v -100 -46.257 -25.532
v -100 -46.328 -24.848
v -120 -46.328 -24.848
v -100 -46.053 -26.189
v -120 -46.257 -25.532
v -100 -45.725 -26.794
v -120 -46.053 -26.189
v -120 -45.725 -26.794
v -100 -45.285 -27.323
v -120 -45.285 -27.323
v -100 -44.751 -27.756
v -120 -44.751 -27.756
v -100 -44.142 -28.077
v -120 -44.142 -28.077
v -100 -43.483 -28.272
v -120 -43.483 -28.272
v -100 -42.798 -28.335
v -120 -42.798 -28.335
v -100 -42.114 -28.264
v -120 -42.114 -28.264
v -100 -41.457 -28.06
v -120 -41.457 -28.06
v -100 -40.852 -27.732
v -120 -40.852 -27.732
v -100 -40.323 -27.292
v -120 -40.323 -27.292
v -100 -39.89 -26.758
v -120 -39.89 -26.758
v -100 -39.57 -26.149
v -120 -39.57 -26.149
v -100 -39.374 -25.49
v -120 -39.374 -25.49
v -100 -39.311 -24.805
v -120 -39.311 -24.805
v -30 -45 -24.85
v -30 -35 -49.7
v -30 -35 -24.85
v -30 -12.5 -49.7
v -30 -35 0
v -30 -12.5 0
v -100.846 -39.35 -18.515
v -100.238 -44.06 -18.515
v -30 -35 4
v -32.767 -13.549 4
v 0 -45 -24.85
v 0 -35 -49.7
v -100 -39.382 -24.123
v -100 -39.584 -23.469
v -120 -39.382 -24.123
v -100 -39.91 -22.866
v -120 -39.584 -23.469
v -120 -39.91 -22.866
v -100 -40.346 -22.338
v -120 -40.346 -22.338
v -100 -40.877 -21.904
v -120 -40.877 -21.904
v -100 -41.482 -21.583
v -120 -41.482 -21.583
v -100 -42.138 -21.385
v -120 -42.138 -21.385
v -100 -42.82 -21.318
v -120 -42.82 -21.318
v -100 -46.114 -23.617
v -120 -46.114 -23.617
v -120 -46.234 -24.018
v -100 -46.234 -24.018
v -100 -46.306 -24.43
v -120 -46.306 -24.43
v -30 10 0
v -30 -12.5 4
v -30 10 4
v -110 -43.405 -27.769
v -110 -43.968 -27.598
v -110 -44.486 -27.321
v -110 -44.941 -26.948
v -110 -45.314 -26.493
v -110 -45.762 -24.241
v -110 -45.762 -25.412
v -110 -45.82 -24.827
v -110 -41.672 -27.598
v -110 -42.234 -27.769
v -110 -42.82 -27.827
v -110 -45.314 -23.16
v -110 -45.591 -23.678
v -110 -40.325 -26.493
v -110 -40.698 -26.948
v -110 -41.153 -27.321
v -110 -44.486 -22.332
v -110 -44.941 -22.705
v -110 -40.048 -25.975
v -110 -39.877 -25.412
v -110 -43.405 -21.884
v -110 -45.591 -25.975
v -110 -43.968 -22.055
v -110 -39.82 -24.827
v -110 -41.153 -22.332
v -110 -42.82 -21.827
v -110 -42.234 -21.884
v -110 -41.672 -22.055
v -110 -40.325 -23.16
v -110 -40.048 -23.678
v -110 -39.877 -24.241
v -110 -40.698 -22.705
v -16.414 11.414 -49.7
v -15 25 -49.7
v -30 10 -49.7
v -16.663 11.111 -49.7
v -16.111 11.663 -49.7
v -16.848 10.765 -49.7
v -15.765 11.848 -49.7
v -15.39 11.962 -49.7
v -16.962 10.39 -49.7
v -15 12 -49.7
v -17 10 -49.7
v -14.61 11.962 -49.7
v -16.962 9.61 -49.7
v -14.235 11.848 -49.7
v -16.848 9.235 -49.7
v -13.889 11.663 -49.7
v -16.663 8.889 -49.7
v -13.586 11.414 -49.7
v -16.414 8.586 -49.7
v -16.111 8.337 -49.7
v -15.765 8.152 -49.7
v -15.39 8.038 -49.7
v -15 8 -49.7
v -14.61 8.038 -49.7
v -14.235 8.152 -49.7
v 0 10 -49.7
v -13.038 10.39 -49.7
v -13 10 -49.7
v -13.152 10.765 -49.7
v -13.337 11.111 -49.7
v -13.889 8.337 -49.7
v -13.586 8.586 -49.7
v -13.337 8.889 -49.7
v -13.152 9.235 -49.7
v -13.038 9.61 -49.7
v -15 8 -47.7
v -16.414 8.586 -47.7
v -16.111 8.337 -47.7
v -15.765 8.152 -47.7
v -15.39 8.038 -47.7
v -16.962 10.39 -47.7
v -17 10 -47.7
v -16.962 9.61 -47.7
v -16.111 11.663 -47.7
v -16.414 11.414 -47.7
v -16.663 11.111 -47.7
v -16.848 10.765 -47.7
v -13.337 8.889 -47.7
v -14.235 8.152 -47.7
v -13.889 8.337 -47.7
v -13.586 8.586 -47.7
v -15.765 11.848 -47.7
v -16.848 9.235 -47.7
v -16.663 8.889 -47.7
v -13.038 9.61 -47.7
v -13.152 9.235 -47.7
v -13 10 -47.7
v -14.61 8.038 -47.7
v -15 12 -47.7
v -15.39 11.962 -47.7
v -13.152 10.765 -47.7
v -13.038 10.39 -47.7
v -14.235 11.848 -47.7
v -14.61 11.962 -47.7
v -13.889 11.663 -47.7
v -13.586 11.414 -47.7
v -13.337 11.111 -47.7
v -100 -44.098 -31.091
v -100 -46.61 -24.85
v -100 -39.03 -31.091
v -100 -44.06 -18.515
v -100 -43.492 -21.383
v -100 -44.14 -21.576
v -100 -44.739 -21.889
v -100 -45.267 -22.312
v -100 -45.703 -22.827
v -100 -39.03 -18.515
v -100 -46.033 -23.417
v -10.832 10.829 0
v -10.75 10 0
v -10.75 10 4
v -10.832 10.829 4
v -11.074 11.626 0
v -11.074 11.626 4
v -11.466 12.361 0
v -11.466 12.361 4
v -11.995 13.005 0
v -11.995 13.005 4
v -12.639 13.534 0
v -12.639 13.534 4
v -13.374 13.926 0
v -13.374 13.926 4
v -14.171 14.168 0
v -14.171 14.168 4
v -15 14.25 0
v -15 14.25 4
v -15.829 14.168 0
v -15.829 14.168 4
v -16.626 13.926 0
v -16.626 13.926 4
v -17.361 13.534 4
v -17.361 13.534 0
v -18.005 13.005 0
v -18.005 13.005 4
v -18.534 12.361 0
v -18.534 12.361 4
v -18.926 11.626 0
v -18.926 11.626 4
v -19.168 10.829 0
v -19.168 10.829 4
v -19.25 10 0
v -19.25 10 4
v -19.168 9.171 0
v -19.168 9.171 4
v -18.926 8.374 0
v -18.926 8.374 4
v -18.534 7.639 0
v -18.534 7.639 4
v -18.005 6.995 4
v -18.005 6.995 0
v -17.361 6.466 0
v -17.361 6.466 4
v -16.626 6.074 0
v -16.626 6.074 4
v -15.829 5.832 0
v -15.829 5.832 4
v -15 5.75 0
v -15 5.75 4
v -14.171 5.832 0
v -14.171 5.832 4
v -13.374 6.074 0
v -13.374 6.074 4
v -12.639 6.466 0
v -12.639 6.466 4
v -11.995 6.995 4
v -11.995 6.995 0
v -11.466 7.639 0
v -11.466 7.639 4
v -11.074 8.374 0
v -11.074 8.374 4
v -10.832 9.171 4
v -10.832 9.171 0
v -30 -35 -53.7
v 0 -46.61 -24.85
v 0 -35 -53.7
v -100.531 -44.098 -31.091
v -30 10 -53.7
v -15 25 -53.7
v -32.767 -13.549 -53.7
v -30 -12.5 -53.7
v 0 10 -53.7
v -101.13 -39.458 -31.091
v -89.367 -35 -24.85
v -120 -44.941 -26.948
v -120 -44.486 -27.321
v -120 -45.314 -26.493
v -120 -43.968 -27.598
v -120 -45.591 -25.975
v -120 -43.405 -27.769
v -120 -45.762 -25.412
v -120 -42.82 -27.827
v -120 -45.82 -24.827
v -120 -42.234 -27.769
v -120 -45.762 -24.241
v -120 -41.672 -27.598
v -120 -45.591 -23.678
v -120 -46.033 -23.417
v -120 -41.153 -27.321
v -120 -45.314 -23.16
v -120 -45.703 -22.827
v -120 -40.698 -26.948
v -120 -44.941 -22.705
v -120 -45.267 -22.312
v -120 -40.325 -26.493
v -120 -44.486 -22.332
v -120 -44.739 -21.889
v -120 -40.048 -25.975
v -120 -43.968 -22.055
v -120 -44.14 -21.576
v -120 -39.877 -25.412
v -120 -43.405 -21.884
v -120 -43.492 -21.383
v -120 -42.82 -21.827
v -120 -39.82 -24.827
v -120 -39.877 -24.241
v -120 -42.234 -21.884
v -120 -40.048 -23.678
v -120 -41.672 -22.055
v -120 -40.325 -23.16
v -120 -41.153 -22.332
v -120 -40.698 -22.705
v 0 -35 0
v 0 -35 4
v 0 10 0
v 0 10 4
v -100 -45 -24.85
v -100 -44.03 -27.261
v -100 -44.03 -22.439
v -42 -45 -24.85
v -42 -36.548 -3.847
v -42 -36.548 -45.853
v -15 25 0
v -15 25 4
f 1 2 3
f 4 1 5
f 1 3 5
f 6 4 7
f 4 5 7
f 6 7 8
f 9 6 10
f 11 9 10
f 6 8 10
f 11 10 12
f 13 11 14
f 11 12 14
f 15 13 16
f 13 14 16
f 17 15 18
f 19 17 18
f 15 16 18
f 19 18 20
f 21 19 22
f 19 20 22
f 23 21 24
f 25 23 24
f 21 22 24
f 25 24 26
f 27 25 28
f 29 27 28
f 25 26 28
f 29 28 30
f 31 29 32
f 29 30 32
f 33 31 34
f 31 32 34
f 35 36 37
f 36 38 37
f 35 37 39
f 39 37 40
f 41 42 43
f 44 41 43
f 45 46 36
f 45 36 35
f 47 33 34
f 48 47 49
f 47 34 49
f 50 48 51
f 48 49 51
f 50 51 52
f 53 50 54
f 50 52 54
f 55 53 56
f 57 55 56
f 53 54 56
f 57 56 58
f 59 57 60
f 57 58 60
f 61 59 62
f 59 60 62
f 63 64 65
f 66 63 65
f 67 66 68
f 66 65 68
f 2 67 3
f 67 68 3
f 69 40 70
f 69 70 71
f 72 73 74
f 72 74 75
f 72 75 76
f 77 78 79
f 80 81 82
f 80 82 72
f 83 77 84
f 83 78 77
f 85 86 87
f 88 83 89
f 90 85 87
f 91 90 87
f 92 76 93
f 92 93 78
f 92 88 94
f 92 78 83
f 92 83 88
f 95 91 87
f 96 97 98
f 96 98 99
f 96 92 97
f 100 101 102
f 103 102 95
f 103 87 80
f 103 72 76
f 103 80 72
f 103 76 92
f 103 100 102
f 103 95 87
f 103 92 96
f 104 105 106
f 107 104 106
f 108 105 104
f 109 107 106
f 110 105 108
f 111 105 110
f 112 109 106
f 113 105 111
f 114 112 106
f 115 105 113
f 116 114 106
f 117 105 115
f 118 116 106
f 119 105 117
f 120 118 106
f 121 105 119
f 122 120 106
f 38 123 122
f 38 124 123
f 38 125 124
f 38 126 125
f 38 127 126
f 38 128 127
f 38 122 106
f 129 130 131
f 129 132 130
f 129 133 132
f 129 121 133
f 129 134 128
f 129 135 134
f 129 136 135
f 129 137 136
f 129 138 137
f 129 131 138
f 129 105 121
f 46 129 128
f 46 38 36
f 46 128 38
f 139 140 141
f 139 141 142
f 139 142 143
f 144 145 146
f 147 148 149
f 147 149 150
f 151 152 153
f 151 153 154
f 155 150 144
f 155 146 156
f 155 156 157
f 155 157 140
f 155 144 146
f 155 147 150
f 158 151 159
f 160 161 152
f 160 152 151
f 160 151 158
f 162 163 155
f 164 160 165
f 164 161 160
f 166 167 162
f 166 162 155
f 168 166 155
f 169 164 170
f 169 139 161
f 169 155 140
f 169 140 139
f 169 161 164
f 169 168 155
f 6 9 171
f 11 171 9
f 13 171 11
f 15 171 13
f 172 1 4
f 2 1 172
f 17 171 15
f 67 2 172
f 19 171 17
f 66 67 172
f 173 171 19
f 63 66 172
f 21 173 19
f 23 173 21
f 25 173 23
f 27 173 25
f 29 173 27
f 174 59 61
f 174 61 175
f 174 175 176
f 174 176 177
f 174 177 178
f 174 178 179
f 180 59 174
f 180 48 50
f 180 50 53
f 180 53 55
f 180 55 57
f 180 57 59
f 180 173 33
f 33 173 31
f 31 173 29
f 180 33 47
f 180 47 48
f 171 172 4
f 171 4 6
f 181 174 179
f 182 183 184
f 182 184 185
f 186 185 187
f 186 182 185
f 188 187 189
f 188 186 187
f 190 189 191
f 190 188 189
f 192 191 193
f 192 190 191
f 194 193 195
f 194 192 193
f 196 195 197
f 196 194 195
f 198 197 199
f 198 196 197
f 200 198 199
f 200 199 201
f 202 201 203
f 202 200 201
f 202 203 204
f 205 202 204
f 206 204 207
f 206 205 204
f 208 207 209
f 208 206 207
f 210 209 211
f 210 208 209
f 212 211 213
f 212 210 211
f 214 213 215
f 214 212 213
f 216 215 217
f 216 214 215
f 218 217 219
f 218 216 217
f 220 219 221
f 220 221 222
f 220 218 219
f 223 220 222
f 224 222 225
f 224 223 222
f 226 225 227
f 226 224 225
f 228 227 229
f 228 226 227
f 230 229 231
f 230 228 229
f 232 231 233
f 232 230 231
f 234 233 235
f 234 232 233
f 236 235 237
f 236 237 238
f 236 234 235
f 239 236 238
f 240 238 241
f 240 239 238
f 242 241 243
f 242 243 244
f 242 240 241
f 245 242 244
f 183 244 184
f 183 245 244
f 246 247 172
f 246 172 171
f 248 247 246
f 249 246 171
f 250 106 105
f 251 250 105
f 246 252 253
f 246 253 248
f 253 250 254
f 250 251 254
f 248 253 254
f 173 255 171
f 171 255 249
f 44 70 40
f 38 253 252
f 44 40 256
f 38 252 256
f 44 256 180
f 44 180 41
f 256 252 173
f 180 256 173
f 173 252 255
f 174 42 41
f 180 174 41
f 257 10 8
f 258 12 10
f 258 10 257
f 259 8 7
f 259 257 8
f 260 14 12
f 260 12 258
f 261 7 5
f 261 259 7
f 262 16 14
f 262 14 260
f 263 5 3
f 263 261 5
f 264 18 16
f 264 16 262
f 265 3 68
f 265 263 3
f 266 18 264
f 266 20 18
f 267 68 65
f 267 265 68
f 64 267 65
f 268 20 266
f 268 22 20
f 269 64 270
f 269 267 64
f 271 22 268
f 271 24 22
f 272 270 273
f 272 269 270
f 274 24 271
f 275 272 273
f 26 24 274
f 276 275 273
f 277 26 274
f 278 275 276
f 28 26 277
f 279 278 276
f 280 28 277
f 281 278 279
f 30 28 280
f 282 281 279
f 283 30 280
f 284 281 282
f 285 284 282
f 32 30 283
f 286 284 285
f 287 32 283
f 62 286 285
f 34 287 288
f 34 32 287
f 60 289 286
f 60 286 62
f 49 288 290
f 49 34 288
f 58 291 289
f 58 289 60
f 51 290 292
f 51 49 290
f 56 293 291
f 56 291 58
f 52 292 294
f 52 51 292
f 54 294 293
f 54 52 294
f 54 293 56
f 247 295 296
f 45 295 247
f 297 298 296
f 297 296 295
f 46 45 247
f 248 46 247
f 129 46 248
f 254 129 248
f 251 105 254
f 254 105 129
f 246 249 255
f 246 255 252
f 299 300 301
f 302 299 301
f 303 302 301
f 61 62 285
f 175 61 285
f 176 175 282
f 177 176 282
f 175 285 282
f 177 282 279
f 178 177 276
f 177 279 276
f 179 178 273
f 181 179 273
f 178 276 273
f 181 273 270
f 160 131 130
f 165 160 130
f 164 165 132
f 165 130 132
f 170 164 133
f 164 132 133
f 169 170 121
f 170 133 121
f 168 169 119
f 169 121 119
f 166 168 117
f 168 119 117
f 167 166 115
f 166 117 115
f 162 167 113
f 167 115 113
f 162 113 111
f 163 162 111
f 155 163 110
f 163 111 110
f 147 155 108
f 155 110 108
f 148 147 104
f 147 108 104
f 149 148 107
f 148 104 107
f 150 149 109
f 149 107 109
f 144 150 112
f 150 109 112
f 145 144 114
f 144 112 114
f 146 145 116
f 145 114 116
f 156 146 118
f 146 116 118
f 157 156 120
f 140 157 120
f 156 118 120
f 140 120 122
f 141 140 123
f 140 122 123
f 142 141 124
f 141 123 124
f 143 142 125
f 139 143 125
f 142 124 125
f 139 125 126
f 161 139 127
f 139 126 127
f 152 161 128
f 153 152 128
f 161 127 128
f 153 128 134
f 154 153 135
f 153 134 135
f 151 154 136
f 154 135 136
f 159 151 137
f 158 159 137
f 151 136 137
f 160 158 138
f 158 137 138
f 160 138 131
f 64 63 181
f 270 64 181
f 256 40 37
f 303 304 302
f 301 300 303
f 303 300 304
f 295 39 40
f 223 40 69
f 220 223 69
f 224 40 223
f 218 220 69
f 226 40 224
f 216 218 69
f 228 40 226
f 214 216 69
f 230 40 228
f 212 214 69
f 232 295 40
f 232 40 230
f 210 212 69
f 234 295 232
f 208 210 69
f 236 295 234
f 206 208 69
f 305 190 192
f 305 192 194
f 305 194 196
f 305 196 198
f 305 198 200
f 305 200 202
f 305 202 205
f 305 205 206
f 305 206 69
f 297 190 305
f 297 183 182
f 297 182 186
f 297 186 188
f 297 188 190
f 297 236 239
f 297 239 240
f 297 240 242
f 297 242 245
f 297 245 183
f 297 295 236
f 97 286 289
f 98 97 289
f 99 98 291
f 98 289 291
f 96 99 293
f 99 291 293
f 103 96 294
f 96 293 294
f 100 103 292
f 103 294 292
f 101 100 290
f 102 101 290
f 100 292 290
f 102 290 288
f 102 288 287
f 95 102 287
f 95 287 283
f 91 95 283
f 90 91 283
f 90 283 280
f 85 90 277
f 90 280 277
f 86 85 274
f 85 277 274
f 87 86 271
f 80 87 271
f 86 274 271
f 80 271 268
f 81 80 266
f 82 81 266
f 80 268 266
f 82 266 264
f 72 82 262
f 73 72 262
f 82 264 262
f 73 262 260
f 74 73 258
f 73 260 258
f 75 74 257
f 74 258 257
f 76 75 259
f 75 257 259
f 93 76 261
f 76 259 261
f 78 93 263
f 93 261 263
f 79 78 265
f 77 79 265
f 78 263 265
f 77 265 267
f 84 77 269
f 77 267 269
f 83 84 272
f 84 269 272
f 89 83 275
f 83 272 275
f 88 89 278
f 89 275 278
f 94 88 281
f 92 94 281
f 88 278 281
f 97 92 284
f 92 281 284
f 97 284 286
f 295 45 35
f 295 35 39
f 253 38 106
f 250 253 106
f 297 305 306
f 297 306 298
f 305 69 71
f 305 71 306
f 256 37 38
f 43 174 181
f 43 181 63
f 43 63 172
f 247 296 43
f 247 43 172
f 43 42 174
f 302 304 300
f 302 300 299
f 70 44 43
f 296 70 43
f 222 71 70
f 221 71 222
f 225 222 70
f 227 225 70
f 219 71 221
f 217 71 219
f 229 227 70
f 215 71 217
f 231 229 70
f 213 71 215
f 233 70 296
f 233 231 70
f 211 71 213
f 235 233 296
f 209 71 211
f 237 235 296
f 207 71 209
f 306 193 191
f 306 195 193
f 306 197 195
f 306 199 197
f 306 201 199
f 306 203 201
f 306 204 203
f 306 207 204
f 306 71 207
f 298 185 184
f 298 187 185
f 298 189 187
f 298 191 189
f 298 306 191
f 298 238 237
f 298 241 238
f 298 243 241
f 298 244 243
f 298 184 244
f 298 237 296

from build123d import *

# Parameters (mm, degrees)
SKETCH1_R                = 4.25
BOSS_EXTRUDE1_DEPTH      = 4
BOSS_EXTRUDE2_DEPTH      = 4
SKETCH3_R                = 2
BOSS_EXTRUDE3_DEPTH      = 2
BOSS_EXTRUDE4_DEPTH      = 53.7
BOSS_EXTRUDE4_DEPTH_BACK = 4
CUT_EXTRUDE1_DEPTH       = 53.7
BOSS_EXTRUDE5_DEPTH      = 120
CUT_EXTRUDE2_DEPTH       = 120
CUT_EXTRUDE2_DEPTH_BACK  = 120
BOSS_EXTRUDE6_DEPTH      = 53.7
BOSS_EXTRUDE6_DEPTH_BACK = 4
CUT_EXTRUDE3_DEPTH       = 53.7
CUT_EXTRUDE4_DEPTH       = 53.7
SKETCH18_W               = 12.575700543
SKETCH18_H               = 12.198178211
CUT_EXTRUDE9_DEPTH       = 98.7
BOSS_EXTRUDE7_DEPTH      = 20
CUT_EXTRUDE11_DEPTH      = 20
SKETCH22_R               = 3
CUT_EXTRUDE12_DEPTH      = 10
CUT_EXTRUDE13_DEPTH      = 99
CUT_EXTRUDE14_DEPTH      = 99
BOSS_EXTRUDE8_DEPTH      = 12


with BuildPart() as part:
    # Sketch1 → Boss-Extrude1 (new body)
    with BuildSketch(Plane.XY):
        Polygon((0, 10), (0, -15), (-30, -35), (-30, 10), (-15, 25), align=None)
        with Locations((-15, 10)):
            Circle(SKETCH1_R, mode=Mode.SUBTRACT)
    extrude(amount=BOSS_EXTRUDE1_DEPTH)



with BuildPart() as body_2:
    # Sketch2 → Boss-Extrude2 (new body)
    with BuildSketch(Plane.XY.offset(-49.7)):
        Polygon((-30, -35), (-30, 10), (-15, 25), (0, 10), (0, -15), align=None)
    extrude(amount=-BOSS_EXTRUDE2_DEPTH)

    # Sketch3 → Boss-Extrude3 (add)
    with BuildSketch(Plane.XY.offset(-49.7)):
        with Locations((-15, 10)):
            Circle(SKETCH3_R)
    extrude(amount=BOSS_EXTRUDE3_DEPTH)


with BuildPart() as part_1:
    add(part.part)

    add(body_2.part)  # Boss-Extrude4 merges body 2
    # Sketch4 → Boss-Extrude4 (add, two sides: drawn at the far end of the back side and taken through both)
    with BuildSketch(Plane.XY.offset(-49.7).offset(-BOSS_EXTRUDE4_DEPTH_BACK)):
        Polygon((-30, -35), (0, -35), (0, -15), align=None)
    extrude(amount=BOSS_EXTRUDE4_DEPTH + BOSS_EXTRUDE4_DEPTH_BACK)

    # Sketch5 → Cut-Extrude1 (cut)
    with BuildSketch(Plane(origin=(0, 0, 0), x_dir=(0, 0, -1), z_dir=(1, 0, 0))):
        Polygon((24.85, -15), (49.7, -15), (49.7, -35), (0, -35), (0, -15), align=None)
    extrude(amount=-CUT_EXTRUDE1_DEPTH, mode=Mode.SUBTRACT)


with BuildPart() as cut_extrude1_piece_1:
    # of the separate pieces the step leaves, piece 1, a body of its own (cut_extrude1_pieces)
    add(part_1.part.solids().sort_by_distance((-30, -35, -49.7))[0])



with BuildPart() as cut_extrude1_piece_2:
    # of the separate pieces the step leaves, piece 2, a body of its own (cut_extrude1_pieces)
    add(part_1.part.solids().sort_by_distance((0, -35, 0))[0])


with BuildPart() as cut_extrude1_piece_1_1:
    add(cut_extrude1_piece_1.part)

    add(cut_extrude1_piece_2.part)  # Boss-Extrude5 merges Cut-Extrude1 piece 2
    # Sketch6 → Boss-Extrude5 (add)
    with BuildSketch(Plane(origin=(0, 0, 0), x_dir=(0, 0, -1), z_dir=(1, 0, 0))):
        Polygon((0, -35), (-4, -35), (24.85, -46.609657949), (53.7, -35), (49.7, -35), (24.85, -45), align=None)
    extrude(amount=-BOSS_EXTRUDE5_DEPTH)

    # Sketch7 → Cut-Extrude2 (cut, two sides: drawn at the far end of the back side and taken through both)
    with BuildSketch(Plane.XY.offset(-49.7).offset(-CUT_EXTRUDE2_DEPTH_BACK)):
        Polygon((-30, -35), (-120, -35), (-120, -46.609657949), align=None)
    extrude(amount=CUT_EXTRUDE2_DEPTH + CUT_EXTRUDE2_DEPTH_BACK, mode=Mode.SUBTRACT)

    # Sketch8 → Boss-Extrude6 (add, two sides: drawn at the far end of the back side and taken through both)
    with BuildSketch(Plane.XY.offset(-49.7).offset(-BOSS_EXTRUDE6_DEPTH_BACK)):
        Polygon((-30, -35), (-30, -12.5), (-120, -46.609657949), align=None)
    extrude(amount=BOSS_EXTRUDE6_DEPTH + BOSS_EXTRUDE6_DEPTH_BACK)

    # Sketch9 → Cut-Extrude3 (cut)
    with BuildSketch(Plane(origin=(3.949939329, -30.620586856, 0), x_dir=(0.991782404932817, 0.12793616089940293, 0), z_dir=(0.12793616089940293, -0.991782404932817, 0))):
        Polygon((-124.976949291, -24.85), (-34.231237779, -53.7), (-124.976949291, -53.7), align=None)
    extrude(amount=-CUT_EXTRUDE3_DEPTH, mode=Mode.SUBTRACT)

    # Sketch10 → Cut-Extrude4 (cut)
    with BuildSketch(Plane(origin=(3.949939329, -30.620586856, 0), x_dir=(0.991782404932817, 0.12793616089940293, 0), z_dir=(0.12793616089940293, -0.991782404932817, 0))):
        Polygon((-124.976949291, -24.85), (-34.231237779, 4), (-124.976949291, 4), align=None)
    extrude(amount=-CUT_EXTRUDE4_DEPTH, mode=Mode.SUBTRACT)

    # Sketch18 → Cut-Extrude9 (cut)
    with BuildSketch(Plane(origin=(-100, 0, 0), x_dir=(0, 0, -1), z_dir=(1, 0, 0))):
        with Locations((24.80300407, -45.072632523)):
            Rectangle(SKETCH18_W, SKETCH18_H)
    extrude(amount=-CUT_EXTRUDE9_DEPTH, mode=Mode.SUBTRACT)

    # Sketch19 → Boss-Extrude7 (add)
    with BuildSketch(Plane.ZY.offset(100)):
        Polygon((-31.090854341, -39.02973396), (-31.090854341, -44.098247751), (-24.85, -46.609657949), (-18.515153798, -44.060424064), (-18.515153798, -39.02973396), align=None)
    extrude(amount=BOSS_EXTRUDE7_DEPTH)

    # Sketch20 → Cut-Extrude11 (cut)
    with BuildSketch(Plane.ZY.offset(120)):
        with BuildLine():
            Line((-18.515153798, -39.02973396), (-24.80300407, -39.02973396))
            Line((-24.80300407, -39.02973396), (-24.804747468, -39.310924888))
            ThreePointArc((-24.804747468, -39.310924888), (-22.337699017, -40.346275812), (-21.317663529, -42.819695955))
            ThreePointArc((-21.317663529, -42.819695955), (-21.889089638, -44.738955206), (-23.417250653, -46.033098856))
            Line((-23.417250653, -46.033098856), (-18.515153798, -44.060424064))
            Line((-18.515153798, -44.060424064), (-18.515153798, -39.02973396))
        make_face()
        with BuildLine():
            Line((-24.804747468, -39.310924888), (-24.80300407, -39.02973396))
            Line((-24.80300407, -39.02973396), (-31.090854341, -39.02973396))
            Line((-31.090854341, -39.02973396), (-31.090854341, -44.098247751))
            Line((-31.090854341, -44.098247751), (-24.85, -46.609657949))
            Line((-24.85, -46.609657949), (-24.848256601, -46.328467021))
            ThreePointArc((-24.848256601, -46.328467021), (-28.335273102, -42.797941388), (-24.804747468, -39.310924888))
        make_face()
        with BuildLine():
            ThreePointArc((-23.617143522, -46.113538642), (-24.223054162, -46.276254695), (-24.848256601, -46.328467021))
            Line((-24.848256601, -46.328467021), (-24.85, -46.609657949))
            Line((-24.85, -46.609657949), (-23.617143522, -46.113538642))
        make_face()
    extrude(amount=-CUT_EXTRUDE11_DEPTH, mode=Mode.SUBTRACT)

    # Sketch22 → Cut-Extrude12 (cut)
    with BuildSketch(Plane.ZY.offset(120)):
        with Locations((-24.826502035, -42.819695955)):
            Circle(SKETCH22_R)
    extrude(amount=-CUT_EXTRUDE12_DEPTH, mode=Mode.SUBTRACT)

    # Sketch23 → Cut-Extrude13 (cut)
    with BuildSketch(Plane(origin=(-30, 0, 0), x_dir=(0, 0, -1), z_dir=(1, 0, 0))):
        Polygon((0, -12.5), (24.300610602, -23.722317099), (49.7, -12.5), align=None)
    extrude(amount=-CUT_EXTRUDE13_DEPTH, mode=Mode.SUBTRACT)

    # Sketch24 → Cut-Extrude14 (cut)
    with BuildSketch(Plane(origin=(-30, 0, 0), x_dir=(0, 0, -1), z_dir=(1, 0, 0))):
        Polygon((0, -12.5), (24.85, -35), (49.7, -12.5), (24.300610602, -23.722317099), align=None)
    extrude(amount=-CUT_EXTRUDE14_DEPTH, mode=Mode.SUBTRACT)

    # Sketch25 → Boss-Extrude8 (add)
    with BuildSketch(Plane(origin=(-30, 0, 0), x_dir=(0, 0, -1), z_dir=(1, 0, 0))):
        Polygon((0, -35), (49.7, -35), (24.85, -45), align=None)
    extrude(amount=-BOSS_EXTRUDE8_DEPTH)


solid = cut_extrude1_piece_1_1.part
